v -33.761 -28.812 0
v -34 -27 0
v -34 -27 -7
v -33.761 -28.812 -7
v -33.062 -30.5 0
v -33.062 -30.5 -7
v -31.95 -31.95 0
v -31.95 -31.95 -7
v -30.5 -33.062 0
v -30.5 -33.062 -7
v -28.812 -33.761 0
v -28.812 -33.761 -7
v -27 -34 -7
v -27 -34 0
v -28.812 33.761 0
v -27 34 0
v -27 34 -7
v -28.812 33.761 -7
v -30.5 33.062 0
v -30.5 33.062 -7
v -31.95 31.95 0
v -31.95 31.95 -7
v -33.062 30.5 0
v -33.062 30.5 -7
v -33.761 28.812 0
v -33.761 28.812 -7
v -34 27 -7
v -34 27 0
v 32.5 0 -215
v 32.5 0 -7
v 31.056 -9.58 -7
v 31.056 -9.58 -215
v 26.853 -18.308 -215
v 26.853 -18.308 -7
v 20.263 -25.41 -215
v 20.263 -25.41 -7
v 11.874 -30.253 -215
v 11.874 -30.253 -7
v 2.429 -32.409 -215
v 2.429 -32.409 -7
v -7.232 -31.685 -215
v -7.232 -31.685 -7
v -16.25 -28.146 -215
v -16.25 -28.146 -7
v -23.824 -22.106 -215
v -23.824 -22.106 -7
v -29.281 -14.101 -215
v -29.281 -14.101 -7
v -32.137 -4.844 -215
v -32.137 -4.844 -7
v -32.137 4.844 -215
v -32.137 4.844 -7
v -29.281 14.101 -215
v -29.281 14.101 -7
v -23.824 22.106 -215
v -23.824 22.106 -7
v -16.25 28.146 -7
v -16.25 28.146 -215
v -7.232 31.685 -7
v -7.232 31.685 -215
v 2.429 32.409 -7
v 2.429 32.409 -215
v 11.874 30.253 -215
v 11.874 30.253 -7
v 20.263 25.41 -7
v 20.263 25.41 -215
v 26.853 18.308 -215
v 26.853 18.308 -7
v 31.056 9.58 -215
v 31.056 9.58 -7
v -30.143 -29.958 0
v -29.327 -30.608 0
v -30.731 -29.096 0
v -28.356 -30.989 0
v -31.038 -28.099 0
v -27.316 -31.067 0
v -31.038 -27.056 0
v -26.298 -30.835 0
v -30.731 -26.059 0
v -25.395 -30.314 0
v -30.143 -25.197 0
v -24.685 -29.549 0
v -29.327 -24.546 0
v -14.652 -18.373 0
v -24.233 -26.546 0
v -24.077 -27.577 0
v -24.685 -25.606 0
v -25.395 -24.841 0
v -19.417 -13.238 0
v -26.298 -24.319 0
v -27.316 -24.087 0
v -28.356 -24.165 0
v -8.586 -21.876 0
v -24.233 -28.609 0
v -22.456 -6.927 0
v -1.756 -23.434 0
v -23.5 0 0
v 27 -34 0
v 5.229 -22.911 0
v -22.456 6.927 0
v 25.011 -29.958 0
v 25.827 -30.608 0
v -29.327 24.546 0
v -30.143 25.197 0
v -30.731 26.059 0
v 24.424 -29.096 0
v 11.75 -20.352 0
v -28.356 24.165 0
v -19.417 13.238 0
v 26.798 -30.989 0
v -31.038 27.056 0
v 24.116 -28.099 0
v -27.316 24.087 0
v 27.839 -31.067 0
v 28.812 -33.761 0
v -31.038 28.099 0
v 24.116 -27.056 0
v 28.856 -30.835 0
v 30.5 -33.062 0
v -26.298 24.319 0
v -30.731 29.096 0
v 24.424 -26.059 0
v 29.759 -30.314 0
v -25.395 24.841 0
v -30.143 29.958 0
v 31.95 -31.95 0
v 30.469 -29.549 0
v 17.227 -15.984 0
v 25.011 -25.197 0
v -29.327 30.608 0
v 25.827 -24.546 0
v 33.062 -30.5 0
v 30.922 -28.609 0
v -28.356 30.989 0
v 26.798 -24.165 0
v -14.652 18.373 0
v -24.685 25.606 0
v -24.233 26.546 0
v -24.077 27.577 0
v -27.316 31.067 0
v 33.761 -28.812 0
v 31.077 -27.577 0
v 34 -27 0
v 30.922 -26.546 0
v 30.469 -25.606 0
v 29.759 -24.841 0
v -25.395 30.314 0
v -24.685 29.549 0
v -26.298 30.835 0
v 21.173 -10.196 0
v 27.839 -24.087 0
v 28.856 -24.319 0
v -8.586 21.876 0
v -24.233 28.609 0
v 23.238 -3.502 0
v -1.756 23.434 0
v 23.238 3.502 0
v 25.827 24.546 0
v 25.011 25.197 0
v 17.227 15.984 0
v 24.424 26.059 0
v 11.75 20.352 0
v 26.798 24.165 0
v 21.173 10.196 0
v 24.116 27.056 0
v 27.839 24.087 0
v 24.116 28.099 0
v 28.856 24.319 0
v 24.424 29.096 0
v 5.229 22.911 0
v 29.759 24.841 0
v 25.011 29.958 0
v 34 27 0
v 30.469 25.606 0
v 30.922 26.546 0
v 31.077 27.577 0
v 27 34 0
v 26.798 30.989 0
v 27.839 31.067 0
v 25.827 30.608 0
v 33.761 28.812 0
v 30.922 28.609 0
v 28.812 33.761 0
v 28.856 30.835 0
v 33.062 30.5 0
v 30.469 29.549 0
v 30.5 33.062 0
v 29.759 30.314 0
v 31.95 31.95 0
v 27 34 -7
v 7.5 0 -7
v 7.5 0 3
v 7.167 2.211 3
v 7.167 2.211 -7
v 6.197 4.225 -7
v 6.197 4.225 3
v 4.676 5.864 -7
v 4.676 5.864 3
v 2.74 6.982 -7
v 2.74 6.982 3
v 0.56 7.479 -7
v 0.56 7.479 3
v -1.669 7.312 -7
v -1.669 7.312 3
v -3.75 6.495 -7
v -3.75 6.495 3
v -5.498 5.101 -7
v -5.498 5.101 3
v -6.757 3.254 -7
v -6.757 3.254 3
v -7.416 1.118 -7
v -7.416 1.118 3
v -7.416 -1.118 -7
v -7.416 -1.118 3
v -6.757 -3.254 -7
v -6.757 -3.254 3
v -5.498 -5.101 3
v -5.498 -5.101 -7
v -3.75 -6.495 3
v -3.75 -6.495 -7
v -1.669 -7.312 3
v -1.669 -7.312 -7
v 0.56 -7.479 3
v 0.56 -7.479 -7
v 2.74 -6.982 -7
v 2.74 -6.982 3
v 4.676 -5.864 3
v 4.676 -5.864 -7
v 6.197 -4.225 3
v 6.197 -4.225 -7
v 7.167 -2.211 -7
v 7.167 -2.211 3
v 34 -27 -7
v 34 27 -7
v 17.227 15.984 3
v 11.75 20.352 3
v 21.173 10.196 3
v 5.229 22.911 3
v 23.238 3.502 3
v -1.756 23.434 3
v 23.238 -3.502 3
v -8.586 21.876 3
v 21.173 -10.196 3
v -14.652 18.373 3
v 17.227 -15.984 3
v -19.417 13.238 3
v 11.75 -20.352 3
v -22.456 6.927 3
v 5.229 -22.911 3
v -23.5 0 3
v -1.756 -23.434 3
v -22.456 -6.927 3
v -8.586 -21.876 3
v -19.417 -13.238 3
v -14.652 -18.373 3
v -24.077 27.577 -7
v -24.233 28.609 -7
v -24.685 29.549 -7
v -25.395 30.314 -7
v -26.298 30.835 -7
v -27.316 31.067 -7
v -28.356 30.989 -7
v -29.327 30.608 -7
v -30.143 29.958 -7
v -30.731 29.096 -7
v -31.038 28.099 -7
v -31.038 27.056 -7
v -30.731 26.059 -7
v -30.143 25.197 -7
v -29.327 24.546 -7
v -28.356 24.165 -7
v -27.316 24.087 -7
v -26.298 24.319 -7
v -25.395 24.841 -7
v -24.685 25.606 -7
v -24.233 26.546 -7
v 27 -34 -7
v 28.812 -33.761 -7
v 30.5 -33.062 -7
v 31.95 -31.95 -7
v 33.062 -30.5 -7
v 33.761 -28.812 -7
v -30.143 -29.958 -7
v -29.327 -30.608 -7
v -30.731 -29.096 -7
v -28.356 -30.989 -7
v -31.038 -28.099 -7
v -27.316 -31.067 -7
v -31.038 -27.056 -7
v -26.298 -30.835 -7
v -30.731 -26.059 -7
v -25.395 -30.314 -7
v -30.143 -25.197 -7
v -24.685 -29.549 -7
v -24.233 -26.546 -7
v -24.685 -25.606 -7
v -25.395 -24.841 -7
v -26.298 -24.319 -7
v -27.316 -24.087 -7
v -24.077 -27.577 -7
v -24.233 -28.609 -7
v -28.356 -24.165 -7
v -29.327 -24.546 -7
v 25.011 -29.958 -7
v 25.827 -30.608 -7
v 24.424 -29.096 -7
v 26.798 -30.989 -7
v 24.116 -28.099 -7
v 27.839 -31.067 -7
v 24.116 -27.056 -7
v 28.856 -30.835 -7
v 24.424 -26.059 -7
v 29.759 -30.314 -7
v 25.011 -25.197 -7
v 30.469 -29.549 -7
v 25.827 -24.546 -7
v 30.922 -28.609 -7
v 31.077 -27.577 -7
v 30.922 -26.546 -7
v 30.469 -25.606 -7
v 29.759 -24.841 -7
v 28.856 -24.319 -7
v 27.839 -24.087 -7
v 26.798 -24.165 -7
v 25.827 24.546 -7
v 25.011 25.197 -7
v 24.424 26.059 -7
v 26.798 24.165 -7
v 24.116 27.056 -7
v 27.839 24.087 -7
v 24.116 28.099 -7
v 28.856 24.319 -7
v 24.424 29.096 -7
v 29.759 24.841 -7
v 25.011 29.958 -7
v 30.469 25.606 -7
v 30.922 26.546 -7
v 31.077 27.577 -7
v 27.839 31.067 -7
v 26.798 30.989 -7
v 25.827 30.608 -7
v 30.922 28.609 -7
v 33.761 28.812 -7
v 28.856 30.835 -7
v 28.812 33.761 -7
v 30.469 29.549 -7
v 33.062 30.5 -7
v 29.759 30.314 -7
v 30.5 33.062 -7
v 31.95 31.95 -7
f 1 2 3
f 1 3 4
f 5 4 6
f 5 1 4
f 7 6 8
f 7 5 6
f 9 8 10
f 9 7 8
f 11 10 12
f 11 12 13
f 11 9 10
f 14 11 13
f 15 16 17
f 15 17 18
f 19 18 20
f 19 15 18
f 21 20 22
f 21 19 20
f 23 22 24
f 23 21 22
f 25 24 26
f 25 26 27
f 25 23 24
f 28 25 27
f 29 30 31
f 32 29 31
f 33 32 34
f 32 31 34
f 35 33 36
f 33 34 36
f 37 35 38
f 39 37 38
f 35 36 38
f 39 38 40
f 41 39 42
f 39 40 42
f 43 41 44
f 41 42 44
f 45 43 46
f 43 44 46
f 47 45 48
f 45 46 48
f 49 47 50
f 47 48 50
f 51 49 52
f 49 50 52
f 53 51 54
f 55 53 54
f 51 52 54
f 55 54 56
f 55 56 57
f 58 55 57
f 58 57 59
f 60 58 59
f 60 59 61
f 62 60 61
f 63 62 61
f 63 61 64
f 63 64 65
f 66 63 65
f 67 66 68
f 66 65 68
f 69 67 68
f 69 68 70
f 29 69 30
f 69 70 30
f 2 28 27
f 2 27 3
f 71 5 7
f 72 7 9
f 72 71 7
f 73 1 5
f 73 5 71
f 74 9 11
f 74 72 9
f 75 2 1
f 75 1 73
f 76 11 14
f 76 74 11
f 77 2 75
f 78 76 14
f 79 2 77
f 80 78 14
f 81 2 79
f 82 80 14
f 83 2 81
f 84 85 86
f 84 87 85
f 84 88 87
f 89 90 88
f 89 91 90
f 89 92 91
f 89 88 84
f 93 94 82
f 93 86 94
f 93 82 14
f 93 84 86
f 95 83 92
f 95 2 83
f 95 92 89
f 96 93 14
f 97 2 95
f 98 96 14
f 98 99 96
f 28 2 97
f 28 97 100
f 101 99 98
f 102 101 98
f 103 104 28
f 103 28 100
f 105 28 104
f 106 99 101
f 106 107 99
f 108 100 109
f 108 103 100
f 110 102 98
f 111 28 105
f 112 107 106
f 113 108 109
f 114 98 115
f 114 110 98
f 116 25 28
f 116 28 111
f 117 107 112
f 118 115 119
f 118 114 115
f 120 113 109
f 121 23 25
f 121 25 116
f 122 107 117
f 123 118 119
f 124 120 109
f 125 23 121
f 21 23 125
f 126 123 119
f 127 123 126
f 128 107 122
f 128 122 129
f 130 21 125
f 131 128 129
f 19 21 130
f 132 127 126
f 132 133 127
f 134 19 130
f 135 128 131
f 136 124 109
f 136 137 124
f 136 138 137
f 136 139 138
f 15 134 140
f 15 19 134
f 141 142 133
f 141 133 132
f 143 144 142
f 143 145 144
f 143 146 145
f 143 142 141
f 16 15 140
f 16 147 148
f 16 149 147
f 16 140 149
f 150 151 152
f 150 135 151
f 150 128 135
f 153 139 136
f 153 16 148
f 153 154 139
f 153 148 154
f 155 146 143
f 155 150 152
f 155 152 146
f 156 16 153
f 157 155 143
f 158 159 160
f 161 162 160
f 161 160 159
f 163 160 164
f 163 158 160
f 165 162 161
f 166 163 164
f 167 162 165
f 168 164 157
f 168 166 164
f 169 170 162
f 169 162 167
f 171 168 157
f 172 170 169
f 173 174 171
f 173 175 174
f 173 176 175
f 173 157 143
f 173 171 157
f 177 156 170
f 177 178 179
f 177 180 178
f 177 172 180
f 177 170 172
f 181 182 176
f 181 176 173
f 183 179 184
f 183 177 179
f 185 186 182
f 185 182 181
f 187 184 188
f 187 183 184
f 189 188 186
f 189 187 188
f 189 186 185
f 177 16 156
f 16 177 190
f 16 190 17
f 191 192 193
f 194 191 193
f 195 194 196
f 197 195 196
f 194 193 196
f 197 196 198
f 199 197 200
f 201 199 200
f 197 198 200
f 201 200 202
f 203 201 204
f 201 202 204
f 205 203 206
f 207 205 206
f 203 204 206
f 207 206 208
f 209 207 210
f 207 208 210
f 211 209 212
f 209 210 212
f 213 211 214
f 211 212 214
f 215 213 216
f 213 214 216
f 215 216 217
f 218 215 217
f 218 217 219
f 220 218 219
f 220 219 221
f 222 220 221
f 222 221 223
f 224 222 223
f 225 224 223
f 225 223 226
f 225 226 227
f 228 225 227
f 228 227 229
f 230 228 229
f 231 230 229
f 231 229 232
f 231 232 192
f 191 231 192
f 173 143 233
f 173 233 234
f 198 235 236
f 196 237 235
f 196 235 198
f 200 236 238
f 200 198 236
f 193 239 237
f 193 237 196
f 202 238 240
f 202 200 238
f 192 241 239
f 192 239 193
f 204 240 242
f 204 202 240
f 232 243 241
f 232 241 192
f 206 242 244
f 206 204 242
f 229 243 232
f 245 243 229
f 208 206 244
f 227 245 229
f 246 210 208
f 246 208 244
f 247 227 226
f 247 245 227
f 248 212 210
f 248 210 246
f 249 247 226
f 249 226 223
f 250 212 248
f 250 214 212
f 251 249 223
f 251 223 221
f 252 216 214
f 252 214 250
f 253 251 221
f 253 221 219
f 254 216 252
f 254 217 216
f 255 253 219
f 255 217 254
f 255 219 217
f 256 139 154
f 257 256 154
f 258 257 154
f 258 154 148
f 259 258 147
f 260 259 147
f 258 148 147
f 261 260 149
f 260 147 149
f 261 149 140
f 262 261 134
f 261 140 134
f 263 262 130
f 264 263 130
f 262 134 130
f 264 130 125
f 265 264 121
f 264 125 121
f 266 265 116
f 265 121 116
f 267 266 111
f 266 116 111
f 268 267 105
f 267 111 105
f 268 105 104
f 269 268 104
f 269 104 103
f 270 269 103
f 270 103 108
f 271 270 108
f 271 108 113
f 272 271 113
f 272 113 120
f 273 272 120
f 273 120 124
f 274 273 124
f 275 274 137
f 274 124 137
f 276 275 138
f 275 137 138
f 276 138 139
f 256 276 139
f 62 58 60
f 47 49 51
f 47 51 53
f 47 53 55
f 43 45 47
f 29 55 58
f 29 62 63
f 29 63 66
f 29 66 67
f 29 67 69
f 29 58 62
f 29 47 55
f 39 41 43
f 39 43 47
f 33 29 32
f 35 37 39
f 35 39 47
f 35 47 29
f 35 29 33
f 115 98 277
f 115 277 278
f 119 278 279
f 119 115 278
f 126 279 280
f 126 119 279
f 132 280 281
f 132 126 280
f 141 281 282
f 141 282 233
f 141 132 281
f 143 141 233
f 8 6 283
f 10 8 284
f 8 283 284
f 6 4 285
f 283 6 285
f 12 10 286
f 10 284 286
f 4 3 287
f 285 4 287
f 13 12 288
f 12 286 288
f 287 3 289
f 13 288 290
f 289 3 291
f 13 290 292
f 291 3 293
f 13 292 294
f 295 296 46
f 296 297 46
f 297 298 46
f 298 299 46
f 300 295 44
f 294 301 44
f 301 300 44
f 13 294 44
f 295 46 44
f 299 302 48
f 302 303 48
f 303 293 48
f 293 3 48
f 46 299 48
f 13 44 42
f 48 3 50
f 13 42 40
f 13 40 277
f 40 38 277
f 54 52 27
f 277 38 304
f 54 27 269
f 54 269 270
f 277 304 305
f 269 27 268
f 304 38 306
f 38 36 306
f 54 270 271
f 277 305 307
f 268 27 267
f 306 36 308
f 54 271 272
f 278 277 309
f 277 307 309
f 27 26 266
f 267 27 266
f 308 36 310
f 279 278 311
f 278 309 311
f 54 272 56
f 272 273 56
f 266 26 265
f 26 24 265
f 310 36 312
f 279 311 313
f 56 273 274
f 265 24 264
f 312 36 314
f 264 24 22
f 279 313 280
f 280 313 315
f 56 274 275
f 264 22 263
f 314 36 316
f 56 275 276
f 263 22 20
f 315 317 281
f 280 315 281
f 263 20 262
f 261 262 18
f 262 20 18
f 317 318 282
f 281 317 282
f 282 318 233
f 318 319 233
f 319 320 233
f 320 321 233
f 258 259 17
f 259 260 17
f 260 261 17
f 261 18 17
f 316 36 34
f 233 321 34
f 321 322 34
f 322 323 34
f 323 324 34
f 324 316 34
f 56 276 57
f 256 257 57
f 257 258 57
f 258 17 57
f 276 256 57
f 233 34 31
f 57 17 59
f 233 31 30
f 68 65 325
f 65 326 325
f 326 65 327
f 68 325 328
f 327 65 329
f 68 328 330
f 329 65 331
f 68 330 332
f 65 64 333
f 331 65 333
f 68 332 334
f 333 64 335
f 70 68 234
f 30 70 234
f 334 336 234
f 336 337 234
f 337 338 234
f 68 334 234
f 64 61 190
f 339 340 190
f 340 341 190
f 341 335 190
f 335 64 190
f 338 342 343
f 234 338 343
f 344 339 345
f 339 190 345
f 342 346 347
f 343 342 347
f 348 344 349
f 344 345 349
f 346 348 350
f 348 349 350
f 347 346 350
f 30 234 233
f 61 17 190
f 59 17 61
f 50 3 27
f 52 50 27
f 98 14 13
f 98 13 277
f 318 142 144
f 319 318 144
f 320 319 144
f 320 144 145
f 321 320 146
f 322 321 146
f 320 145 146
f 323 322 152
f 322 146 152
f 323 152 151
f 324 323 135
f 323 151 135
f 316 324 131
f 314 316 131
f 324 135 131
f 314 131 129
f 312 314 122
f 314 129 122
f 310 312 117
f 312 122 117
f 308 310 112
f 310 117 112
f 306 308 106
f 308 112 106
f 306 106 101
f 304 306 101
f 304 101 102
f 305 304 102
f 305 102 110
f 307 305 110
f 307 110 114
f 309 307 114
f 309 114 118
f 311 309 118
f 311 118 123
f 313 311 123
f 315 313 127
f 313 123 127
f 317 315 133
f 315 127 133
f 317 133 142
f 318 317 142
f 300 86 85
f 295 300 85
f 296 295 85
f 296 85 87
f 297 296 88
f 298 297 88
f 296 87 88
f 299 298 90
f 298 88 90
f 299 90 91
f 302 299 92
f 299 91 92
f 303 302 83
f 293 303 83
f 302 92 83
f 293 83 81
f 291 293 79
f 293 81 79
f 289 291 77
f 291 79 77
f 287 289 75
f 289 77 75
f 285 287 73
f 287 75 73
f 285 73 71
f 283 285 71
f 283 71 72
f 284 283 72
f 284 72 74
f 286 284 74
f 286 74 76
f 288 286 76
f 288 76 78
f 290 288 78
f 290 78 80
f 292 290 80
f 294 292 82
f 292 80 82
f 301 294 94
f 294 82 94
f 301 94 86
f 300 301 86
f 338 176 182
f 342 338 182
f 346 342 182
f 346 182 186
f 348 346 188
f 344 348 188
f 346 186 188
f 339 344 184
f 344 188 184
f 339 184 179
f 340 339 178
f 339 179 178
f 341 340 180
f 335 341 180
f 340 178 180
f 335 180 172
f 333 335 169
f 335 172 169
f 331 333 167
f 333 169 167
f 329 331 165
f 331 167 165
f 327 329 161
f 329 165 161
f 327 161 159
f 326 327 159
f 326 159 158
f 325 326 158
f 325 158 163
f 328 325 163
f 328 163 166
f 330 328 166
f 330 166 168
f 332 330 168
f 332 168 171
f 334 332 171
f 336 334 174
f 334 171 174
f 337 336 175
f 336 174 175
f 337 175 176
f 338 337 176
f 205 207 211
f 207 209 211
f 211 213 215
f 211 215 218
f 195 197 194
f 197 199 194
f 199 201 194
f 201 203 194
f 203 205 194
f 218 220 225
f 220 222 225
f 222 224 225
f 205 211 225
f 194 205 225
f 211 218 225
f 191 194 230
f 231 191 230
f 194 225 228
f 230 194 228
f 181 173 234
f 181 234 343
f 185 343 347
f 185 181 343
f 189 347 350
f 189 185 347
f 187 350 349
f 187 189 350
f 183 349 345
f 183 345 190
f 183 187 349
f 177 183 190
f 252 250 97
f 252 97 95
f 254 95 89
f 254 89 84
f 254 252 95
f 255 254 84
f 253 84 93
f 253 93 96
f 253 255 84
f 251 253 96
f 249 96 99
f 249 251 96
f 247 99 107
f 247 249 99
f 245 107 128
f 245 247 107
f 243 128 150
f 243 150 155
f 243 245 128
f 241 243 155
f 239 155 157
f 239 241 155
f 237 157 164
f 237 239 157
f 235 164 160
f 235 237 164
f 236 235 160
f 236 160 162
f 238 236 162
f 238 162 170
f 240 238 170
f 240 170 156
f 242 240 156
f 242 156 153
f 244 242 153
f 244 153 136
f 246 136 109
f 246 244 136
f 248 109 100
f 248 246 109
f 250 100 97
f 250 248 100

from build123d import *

# Parameters (mm, degrees)
SKETCH1_R           = 7.5
SKETCH1_R_2         = 3.5
BOSS_EXTRUDE1_DEPTH = 7
SKETCH2_R           = 32.5
BOSS_EXTRUDE2_DEPTH = 208
BOSS_EXTRUDE3_START = 3
SKETCH3_R           = 23.5
SKETCH3_R_2         = 7.5
BOSS_EXTRUDE3_DEPTH = 3


with BuildPart() as part:
    # Sketch1 → Boss-Extrude1 (new body)
    with BuildSketch(Plane.XY):
        with BuildLine():
            Line((-27, -34), (27, -34))
            ThreePointArc((27, -34), (31.949747468, -31.949747468), (34, -27))
            Line((34, -27), (34, 27))
            ThreePointArc((34, 27), (31.949747468, 31.949747468), (27, 34))
            Line((27, 34), (-27, 34))
            ThreePointArc((-27, 34), (-31.949747468, 31.949747468), (-34, 27))
            Line((-34, 27), (-34, -27))
            ThreePointArc((-34, -27), (-31.949747468, -31.949747468), (-27, -34))
        make_face()
        Circle(SKETCH1_R, mode=Mode.SUBTRACT)
        with Locations((27.577164466, 27.577164466)):
            Circle(SKETCH1_R_2, mode=Mode.SUBTRACT)
        with Locations((-27.577164466, 27.577164466)):
            Circle(SKETCH1_R_2, mode=Mode.SUBTRACT)
        with Locations((-27.577164466, -27.577164466)):
            Circle(SKETCH1_R_2, mode=Mode.SUBTRACT)
        with Locations((27.577164466, -27.577164466)):
            Circle(SKETCH1_R_2, mode=Mode.SUBTRACT)
    extrude(amount=-BOSS_EXTRUDE1_DEPTH)

    # Sketch2 → Boss-Extrude2 (add)
    with BuildSketch(Plane(origin=(0, 0, -7), x_dir=(-1, 0, 0), z_dir=(0, 0, -1))):
        with Locations(Location((0, 0, 0), (0, 0, 180))):
            Circle(SKETCH2_R)
    extrude(amount=BOSS_EXTRUDE2_DEPTH)

    # Sketch3 → Boss-Extrude3 (add)
    with BuildSketch(Plane.XY.offset(BOSS_EXTRUDE3_START)):
        with Locations(Location((0, 0, 0), (0, 0, 180))):
            Circle(SKETCH3_R)
        Circle(SKETCH3_R_2, mode=Mode.SUBTRACT)
    extrude(amount=-BOSS_EXTRUDE3_DEPTH)


solid = part.part
